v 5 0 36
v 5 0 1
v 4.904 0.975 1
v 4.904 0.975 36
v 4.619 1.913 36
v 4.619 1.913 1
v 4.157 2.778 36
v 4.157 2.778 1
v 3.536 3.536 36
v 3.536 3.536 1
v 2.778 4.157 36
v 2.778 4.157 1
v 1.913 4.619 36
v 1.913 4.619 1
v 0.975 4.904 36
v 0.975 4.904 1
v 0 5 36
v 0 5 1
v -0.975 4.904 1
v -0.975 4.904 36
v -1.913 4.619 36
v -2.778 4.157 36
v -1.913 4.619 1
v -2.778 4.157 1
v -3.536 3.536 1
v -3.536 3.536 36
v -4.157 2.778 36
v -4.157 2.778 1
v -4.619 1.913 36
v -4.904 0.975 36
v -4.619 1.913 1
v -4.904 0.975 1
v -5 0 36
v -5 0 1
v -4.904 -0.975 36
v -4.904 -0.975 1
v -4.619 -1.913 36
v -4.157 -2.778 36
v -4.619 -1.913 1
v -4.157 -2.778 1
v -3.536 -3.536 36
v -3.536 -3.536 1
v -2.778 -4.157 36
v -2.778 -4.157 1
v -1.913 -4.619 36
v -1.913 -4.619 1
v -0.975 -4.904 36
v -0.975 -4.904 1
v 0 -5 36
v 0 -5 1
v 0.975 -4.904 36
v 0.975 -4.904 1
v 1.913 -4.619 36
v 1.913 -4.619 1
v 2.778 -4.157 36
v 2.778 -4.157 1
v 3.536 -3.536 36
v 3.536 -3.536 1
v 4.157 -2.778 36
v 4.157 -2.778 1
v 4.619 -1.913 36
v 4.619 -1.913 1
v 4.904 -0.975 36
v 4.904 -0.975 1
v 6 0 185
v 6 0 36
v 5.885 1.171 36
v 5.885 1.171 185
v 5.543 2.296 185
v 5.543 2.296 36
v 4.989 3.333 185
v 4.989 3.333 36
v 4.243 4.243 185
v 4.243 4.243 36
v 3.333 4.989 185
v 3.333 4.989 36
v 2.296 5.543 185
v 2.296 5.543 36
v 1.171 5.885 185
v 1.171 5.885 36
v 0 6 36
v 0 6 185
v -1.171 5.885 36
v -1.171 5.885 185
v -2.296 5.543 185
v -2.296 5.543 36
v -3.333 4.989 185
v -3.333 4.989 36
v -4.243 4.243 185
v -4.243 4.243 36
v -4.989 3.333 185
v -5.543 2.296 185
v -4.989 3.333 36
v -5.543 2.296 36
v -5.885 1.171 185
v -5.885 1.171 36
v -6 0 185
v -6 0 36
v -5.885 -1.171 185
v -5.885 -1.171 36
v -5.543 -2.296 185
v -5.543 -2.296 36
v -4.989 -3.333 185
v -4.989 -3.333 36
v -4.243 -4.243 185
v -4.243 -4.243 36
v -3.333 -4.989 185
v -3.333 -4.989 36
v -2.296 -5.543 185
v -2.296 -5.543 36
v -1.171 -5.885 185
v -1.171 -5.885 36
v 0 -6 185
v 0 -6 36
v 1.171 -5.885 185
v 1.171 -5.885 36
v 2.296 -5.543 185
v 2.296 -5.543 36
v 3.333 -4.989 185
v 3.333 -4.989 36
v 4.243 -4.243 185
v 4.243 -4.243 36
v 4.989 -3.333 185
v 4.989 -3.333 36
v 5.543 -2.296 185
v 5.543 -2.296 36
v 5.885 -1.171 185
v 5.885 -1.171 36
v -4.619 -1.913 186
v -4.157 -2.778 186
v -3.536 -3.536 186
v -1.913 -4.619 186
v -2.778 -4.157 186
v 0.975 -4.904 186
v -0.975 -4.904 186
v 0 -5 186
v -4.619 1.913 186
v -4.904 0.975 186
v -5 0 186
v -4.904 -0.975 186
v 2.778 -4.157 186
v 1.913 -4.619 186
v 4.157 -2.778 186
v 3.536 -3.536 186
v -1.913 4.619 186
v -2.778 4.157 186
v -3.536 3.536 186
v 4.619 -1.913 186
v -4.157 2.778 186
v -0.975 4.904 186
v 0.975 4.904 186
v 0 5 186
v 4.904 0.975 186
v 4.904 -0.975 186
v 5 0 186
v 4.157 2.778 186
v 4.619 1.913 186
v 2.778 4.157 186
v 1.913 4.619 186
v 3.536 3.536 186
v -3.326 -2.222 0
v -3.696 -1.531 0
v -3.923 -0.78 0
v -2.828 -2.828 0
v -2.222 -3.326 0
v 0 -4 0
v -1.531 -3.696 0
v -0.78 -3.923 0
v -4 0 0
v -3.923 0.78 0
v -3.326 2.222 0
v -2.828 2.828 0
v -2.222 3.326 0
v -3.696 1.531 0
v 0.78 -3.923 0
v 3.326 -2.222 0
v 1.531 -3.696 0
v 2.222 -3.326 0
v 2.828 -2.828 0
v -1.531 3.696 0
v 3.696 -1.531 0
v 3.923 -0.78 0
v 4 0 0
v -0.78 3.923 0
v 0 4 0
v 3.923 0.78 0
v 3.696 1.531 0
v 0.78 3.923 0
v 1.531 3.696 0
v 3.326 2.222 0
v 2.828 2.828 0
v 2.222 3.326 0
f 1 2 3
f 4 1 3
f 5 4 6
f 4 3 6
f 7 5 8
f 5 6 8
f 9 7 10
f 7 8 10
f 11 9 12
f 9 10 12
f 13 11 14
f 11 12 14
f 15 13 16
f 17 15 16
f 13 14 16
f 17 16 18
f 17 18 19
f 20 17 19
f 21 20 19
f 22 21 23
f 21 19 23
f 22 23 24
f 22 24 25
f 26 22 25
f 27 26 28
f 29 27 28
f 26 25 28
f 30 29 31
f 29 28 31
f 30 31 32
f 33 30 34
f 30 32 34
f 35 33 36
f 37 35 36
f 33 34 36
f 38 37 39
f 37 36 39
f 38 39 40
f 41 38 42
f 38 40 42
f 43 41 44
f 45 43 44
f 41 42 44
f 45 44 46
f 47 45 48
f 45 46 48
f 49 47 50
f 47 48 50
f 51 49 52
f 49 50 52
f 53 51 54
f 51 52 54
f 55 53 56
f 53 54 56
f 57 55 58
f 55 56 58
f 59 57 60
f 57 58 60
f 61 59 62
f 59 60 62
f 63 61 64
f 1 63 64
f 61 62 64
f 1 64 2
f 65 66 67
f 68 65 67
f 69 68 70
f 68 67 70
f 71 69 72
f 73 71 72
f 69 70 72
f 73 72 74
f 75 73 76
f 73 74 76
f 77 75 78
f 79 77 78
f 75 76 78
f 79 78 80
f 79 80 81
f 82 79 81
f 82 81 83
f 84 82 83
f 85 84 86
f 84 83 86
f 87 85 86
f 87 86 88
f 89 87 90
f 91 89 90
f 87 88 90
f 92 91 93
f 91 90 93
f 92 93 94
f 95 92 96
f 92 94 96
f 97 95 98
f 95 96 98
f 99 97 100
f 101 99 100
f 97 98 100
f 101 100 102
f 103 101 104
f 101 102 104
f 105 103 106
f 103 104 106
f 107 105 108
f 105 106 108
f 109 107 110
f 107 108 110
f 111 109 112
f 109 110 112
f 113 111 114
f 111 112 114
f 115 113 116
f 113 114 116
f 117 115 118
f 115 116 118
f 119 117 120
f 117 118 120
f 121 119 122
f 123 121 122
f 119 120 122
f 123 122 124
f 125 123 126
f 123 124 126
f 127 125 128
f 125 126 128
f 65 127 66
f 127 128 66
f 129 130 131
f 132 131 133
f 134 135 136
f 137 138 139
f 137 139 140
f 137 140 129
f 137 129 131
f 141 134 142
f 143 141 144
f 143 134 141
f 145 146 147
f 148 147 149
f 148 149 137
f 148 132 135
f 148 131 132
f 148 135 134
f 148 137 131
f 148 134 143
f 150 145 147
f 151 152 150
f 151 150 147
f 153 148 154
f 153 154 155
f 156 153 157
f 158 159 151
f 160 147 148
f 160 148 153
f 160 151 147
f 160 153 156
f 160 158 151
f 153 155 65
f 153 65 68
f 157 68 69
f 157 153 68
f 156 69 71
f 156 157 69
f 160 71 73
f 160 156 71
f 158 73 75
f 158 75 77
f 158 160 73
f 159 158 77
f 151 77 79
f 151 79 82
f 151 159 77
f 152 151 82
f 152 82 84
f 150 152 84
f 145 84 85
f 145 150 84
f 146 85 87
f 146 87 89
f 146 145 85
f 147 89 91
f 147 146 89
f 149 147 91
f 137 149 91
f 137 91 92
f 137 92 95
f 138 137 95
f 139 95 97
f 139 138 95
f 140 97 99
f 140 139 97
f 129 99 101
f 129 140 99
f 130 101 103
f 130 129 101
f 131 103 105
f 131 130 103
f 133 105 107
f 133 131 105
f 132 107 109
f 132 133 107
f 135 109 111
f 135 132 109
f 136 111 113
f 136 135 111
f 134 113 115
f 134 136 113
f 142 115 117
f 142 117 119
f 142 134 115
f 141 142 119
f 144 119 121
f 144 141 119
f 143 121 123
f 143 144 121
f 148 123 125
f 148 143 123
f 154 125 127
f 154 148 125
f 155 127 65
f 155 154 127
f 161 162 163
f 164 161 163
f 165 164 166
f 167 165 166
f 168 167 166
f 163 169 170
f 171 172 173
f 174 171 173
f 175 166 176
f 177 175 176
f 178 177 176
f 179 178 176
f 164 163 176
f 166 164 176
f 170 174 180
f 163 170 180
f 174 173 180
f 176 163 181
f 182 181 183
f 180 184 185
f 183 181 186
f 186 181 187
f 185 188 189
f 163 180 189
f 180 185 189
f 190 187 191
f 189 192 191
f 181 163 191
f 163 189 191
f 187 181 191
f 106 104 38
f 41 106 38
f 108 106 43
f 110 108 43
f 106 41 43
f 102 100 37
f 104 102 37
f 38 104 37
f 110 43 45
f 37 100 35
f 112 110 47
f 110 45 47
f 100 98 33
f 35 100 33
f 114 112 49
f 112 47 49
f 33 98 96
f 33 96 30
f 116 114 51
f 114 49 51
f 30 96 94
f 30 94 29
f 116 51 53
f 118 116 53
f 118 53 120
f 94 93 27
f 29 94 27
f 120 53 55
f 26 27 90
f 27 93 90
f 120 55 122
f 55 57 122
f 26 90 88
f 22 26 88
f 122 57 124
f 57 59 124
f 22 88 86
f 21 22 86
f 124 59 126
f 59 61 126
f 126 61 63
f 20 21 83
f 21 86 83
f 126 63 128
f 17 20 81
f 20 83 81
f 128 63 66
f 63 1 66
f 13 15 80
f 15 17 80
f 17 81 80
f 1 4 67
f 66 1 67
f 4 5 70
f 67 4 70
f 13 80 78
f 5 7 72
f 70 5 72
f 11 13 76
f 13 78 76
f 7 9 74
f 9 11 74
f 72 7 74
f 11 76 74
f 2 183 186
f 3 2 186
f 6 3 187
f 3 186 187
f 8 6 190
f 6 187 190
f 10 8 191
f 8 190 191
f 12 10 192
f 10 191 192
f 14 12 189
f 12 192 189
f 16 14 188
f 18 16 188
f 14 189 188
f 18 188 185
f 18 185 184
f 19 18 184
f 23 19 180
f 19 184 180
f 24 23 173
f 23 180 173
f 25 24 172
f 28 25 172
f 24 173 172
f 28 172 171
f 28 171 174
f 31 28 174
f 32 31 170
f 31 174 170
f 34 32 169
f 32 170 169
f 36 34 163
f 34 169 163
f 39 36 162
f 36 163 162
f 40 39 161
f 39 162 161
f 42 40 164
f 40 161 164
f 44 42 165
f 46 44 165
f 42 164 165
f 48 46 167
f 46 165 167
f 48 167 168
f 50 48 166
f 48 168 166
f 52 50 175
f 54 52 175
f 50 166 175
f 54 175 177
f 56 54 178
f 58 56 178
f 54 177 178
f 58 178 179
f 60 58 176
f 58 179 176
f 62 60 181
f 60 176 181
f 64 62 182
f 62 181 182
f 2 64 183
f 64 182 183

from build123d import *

# Parameters (mm, degrees)
SKETCH1_R           = 5
BOSS_EXTRUDE1_DEPTH = 36
SKETCH2_R           = 6
BOSS_EXTRUDE2_DEPTH = 150
CHAMFER1_SIZE       = 1


with BuildPart() as part:
    # Sketch1 → Boss-Extrude1 (new body)
    with BuildSketch(Plane.XY):
        Circle(SKETCH1_R)
    extrude(amount=BOSS_EXTRUDE1_DEPTH)

    # Sketch2 → Boss-Extrude2 (add)
    with BuildSketch(Plane.XY.offset(36)):
        Circle(SKETCH2_R)
    extrude(amount=BOSS_EXTRUDE2_DEPTH)

    # Chamfer1
    chamfer1_edges = [part.edges().sort_by_distance(p)[0] for p in [
        (-5, 0, 0),
        (-6, 0, 186),
    ]]
    chamfer(chamfer1_edges, length=CHAMFER1_SIZE)


solid = part.part
